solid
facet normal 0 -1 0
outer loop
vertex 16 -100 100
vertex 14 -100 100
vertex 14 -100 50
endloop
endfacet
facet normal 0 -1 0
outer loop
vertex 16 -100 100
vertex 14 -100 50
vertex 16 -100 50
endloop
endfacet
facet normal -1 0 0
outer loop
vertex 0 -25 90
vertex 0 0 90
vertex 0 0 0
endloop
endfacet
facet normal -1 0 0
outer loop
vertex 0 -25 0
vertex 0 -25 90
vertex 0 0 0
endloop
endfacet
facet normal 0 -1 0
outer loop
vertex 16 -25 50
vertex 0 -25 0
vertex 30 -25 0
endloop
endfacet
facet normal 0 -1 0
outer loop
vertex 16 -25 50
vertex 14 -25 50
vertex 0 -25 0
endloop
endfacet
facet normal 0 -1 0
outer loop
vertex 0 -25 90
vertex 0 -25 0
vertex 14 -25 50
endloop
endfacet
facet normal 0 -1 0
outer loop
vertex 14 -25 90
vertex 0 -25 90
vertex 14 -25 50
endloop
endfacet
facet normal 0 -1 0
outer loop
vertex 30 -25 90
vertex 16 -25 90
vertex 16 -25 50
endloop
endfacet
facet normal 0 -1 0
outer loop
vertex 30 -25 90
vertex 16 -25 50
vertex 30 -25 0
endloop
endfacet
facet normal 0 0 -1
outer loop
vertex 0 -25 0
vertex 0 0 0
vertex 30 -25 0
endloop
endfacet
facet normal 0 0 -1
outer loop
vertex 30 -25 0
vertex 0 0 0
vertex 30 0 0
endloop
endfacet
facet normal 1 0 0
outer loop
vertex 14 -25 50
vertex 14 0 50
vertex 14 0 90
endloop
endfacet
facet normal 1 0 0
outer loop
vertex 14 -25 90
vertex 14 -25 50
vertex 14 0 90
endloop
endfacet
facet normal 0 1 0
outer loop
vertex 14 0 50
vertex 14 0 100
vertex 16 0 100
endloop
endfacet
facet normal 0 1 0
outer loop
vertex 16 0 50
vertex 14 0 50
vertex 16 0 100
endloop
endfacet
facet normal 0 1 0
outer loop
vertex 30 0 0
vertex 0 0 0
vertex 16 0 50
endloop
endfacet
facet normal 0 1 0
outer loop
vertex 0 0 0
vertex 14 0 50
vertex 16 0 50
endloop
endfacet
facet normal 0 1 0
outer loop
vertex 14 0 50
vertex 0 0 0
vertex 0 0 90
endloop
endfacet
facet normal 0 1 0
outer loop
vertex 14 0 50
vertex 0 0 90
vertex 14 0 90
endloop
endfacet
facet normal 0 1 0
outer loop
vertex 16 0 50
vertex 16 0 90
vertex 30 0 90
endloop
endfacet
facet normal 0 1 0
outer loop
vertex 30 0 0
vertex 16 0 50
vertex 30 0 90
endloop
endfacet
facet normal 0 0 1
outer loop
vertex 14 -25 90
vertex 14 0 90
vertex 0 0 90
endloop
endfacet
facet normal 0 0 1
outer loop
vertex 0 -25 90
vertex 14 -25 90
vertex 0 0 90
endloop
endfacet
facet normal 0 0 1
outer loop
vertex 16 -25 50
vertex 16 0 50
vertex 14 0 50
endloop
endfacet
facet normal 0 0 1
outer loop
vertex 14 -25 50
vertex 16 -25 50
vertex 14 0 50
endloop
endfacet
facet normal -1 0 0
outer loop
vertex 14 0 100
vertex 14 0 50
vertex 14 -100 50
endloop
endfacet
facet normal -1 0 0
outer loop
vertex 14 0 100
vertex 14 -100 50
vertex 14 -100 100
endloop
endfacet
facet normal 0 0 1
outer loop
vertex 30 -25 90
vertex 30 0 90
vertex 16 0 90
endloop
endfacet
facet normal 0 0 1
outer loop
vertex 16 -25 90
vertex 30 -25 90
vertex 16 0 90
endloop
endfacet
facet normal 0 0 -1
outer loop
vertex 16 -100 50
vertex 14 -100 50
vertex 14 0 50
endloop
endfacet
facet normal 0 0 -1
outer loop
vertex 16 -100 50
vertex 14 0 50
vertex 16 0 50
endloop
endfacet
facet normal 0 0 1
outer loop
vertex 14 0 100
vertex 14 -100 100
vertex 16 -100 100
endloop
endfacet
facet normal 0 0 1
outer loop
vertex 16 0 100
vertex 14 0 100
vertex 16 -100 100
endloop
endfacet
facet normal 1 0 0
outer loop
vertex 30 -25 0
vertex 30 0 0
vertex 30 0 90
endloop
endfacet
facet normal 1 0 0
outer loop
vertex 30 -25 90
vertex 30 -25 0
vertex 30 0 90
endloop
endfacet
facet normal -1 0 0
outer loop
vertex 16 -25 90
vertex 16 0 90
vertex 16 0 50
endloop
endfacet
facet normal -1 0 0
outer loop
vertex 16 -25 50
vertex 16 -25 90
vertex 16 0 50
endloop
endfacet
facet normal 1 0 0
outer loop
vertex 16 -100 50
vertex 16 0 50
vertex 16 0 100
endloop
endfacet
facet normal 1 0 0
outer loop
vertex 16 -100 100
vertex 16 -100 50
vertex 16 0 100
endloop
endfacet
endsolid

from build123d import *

# Parameters (mm, degrees)
F1_DEPTH = 25
F2_W     = 2
F2_H     = 50
F3_DEPTH = 100


with BuildPart() as f1:
    # F0 (on Front) → F1 (new body)
    with BuildSketch(Plane.XZ):
        Polygon((0, 90), (0, 0), (30, 0), (30, 90), (16, 90), (16, 50), (14, 50), (14, 90), align=None)
    extrude(amount=F1_DEPTH)


with BuildPart() as f3:
    # F2 (on Front) → F3 (new body)
    with BuildSketch(Plane.XZ):
        with Locations((15, 75)):
            Rectangle(F2_W, F2_H)
    extrude(amount=F3_DEPTH)


solid = Compound([f1.part, f3.part])
